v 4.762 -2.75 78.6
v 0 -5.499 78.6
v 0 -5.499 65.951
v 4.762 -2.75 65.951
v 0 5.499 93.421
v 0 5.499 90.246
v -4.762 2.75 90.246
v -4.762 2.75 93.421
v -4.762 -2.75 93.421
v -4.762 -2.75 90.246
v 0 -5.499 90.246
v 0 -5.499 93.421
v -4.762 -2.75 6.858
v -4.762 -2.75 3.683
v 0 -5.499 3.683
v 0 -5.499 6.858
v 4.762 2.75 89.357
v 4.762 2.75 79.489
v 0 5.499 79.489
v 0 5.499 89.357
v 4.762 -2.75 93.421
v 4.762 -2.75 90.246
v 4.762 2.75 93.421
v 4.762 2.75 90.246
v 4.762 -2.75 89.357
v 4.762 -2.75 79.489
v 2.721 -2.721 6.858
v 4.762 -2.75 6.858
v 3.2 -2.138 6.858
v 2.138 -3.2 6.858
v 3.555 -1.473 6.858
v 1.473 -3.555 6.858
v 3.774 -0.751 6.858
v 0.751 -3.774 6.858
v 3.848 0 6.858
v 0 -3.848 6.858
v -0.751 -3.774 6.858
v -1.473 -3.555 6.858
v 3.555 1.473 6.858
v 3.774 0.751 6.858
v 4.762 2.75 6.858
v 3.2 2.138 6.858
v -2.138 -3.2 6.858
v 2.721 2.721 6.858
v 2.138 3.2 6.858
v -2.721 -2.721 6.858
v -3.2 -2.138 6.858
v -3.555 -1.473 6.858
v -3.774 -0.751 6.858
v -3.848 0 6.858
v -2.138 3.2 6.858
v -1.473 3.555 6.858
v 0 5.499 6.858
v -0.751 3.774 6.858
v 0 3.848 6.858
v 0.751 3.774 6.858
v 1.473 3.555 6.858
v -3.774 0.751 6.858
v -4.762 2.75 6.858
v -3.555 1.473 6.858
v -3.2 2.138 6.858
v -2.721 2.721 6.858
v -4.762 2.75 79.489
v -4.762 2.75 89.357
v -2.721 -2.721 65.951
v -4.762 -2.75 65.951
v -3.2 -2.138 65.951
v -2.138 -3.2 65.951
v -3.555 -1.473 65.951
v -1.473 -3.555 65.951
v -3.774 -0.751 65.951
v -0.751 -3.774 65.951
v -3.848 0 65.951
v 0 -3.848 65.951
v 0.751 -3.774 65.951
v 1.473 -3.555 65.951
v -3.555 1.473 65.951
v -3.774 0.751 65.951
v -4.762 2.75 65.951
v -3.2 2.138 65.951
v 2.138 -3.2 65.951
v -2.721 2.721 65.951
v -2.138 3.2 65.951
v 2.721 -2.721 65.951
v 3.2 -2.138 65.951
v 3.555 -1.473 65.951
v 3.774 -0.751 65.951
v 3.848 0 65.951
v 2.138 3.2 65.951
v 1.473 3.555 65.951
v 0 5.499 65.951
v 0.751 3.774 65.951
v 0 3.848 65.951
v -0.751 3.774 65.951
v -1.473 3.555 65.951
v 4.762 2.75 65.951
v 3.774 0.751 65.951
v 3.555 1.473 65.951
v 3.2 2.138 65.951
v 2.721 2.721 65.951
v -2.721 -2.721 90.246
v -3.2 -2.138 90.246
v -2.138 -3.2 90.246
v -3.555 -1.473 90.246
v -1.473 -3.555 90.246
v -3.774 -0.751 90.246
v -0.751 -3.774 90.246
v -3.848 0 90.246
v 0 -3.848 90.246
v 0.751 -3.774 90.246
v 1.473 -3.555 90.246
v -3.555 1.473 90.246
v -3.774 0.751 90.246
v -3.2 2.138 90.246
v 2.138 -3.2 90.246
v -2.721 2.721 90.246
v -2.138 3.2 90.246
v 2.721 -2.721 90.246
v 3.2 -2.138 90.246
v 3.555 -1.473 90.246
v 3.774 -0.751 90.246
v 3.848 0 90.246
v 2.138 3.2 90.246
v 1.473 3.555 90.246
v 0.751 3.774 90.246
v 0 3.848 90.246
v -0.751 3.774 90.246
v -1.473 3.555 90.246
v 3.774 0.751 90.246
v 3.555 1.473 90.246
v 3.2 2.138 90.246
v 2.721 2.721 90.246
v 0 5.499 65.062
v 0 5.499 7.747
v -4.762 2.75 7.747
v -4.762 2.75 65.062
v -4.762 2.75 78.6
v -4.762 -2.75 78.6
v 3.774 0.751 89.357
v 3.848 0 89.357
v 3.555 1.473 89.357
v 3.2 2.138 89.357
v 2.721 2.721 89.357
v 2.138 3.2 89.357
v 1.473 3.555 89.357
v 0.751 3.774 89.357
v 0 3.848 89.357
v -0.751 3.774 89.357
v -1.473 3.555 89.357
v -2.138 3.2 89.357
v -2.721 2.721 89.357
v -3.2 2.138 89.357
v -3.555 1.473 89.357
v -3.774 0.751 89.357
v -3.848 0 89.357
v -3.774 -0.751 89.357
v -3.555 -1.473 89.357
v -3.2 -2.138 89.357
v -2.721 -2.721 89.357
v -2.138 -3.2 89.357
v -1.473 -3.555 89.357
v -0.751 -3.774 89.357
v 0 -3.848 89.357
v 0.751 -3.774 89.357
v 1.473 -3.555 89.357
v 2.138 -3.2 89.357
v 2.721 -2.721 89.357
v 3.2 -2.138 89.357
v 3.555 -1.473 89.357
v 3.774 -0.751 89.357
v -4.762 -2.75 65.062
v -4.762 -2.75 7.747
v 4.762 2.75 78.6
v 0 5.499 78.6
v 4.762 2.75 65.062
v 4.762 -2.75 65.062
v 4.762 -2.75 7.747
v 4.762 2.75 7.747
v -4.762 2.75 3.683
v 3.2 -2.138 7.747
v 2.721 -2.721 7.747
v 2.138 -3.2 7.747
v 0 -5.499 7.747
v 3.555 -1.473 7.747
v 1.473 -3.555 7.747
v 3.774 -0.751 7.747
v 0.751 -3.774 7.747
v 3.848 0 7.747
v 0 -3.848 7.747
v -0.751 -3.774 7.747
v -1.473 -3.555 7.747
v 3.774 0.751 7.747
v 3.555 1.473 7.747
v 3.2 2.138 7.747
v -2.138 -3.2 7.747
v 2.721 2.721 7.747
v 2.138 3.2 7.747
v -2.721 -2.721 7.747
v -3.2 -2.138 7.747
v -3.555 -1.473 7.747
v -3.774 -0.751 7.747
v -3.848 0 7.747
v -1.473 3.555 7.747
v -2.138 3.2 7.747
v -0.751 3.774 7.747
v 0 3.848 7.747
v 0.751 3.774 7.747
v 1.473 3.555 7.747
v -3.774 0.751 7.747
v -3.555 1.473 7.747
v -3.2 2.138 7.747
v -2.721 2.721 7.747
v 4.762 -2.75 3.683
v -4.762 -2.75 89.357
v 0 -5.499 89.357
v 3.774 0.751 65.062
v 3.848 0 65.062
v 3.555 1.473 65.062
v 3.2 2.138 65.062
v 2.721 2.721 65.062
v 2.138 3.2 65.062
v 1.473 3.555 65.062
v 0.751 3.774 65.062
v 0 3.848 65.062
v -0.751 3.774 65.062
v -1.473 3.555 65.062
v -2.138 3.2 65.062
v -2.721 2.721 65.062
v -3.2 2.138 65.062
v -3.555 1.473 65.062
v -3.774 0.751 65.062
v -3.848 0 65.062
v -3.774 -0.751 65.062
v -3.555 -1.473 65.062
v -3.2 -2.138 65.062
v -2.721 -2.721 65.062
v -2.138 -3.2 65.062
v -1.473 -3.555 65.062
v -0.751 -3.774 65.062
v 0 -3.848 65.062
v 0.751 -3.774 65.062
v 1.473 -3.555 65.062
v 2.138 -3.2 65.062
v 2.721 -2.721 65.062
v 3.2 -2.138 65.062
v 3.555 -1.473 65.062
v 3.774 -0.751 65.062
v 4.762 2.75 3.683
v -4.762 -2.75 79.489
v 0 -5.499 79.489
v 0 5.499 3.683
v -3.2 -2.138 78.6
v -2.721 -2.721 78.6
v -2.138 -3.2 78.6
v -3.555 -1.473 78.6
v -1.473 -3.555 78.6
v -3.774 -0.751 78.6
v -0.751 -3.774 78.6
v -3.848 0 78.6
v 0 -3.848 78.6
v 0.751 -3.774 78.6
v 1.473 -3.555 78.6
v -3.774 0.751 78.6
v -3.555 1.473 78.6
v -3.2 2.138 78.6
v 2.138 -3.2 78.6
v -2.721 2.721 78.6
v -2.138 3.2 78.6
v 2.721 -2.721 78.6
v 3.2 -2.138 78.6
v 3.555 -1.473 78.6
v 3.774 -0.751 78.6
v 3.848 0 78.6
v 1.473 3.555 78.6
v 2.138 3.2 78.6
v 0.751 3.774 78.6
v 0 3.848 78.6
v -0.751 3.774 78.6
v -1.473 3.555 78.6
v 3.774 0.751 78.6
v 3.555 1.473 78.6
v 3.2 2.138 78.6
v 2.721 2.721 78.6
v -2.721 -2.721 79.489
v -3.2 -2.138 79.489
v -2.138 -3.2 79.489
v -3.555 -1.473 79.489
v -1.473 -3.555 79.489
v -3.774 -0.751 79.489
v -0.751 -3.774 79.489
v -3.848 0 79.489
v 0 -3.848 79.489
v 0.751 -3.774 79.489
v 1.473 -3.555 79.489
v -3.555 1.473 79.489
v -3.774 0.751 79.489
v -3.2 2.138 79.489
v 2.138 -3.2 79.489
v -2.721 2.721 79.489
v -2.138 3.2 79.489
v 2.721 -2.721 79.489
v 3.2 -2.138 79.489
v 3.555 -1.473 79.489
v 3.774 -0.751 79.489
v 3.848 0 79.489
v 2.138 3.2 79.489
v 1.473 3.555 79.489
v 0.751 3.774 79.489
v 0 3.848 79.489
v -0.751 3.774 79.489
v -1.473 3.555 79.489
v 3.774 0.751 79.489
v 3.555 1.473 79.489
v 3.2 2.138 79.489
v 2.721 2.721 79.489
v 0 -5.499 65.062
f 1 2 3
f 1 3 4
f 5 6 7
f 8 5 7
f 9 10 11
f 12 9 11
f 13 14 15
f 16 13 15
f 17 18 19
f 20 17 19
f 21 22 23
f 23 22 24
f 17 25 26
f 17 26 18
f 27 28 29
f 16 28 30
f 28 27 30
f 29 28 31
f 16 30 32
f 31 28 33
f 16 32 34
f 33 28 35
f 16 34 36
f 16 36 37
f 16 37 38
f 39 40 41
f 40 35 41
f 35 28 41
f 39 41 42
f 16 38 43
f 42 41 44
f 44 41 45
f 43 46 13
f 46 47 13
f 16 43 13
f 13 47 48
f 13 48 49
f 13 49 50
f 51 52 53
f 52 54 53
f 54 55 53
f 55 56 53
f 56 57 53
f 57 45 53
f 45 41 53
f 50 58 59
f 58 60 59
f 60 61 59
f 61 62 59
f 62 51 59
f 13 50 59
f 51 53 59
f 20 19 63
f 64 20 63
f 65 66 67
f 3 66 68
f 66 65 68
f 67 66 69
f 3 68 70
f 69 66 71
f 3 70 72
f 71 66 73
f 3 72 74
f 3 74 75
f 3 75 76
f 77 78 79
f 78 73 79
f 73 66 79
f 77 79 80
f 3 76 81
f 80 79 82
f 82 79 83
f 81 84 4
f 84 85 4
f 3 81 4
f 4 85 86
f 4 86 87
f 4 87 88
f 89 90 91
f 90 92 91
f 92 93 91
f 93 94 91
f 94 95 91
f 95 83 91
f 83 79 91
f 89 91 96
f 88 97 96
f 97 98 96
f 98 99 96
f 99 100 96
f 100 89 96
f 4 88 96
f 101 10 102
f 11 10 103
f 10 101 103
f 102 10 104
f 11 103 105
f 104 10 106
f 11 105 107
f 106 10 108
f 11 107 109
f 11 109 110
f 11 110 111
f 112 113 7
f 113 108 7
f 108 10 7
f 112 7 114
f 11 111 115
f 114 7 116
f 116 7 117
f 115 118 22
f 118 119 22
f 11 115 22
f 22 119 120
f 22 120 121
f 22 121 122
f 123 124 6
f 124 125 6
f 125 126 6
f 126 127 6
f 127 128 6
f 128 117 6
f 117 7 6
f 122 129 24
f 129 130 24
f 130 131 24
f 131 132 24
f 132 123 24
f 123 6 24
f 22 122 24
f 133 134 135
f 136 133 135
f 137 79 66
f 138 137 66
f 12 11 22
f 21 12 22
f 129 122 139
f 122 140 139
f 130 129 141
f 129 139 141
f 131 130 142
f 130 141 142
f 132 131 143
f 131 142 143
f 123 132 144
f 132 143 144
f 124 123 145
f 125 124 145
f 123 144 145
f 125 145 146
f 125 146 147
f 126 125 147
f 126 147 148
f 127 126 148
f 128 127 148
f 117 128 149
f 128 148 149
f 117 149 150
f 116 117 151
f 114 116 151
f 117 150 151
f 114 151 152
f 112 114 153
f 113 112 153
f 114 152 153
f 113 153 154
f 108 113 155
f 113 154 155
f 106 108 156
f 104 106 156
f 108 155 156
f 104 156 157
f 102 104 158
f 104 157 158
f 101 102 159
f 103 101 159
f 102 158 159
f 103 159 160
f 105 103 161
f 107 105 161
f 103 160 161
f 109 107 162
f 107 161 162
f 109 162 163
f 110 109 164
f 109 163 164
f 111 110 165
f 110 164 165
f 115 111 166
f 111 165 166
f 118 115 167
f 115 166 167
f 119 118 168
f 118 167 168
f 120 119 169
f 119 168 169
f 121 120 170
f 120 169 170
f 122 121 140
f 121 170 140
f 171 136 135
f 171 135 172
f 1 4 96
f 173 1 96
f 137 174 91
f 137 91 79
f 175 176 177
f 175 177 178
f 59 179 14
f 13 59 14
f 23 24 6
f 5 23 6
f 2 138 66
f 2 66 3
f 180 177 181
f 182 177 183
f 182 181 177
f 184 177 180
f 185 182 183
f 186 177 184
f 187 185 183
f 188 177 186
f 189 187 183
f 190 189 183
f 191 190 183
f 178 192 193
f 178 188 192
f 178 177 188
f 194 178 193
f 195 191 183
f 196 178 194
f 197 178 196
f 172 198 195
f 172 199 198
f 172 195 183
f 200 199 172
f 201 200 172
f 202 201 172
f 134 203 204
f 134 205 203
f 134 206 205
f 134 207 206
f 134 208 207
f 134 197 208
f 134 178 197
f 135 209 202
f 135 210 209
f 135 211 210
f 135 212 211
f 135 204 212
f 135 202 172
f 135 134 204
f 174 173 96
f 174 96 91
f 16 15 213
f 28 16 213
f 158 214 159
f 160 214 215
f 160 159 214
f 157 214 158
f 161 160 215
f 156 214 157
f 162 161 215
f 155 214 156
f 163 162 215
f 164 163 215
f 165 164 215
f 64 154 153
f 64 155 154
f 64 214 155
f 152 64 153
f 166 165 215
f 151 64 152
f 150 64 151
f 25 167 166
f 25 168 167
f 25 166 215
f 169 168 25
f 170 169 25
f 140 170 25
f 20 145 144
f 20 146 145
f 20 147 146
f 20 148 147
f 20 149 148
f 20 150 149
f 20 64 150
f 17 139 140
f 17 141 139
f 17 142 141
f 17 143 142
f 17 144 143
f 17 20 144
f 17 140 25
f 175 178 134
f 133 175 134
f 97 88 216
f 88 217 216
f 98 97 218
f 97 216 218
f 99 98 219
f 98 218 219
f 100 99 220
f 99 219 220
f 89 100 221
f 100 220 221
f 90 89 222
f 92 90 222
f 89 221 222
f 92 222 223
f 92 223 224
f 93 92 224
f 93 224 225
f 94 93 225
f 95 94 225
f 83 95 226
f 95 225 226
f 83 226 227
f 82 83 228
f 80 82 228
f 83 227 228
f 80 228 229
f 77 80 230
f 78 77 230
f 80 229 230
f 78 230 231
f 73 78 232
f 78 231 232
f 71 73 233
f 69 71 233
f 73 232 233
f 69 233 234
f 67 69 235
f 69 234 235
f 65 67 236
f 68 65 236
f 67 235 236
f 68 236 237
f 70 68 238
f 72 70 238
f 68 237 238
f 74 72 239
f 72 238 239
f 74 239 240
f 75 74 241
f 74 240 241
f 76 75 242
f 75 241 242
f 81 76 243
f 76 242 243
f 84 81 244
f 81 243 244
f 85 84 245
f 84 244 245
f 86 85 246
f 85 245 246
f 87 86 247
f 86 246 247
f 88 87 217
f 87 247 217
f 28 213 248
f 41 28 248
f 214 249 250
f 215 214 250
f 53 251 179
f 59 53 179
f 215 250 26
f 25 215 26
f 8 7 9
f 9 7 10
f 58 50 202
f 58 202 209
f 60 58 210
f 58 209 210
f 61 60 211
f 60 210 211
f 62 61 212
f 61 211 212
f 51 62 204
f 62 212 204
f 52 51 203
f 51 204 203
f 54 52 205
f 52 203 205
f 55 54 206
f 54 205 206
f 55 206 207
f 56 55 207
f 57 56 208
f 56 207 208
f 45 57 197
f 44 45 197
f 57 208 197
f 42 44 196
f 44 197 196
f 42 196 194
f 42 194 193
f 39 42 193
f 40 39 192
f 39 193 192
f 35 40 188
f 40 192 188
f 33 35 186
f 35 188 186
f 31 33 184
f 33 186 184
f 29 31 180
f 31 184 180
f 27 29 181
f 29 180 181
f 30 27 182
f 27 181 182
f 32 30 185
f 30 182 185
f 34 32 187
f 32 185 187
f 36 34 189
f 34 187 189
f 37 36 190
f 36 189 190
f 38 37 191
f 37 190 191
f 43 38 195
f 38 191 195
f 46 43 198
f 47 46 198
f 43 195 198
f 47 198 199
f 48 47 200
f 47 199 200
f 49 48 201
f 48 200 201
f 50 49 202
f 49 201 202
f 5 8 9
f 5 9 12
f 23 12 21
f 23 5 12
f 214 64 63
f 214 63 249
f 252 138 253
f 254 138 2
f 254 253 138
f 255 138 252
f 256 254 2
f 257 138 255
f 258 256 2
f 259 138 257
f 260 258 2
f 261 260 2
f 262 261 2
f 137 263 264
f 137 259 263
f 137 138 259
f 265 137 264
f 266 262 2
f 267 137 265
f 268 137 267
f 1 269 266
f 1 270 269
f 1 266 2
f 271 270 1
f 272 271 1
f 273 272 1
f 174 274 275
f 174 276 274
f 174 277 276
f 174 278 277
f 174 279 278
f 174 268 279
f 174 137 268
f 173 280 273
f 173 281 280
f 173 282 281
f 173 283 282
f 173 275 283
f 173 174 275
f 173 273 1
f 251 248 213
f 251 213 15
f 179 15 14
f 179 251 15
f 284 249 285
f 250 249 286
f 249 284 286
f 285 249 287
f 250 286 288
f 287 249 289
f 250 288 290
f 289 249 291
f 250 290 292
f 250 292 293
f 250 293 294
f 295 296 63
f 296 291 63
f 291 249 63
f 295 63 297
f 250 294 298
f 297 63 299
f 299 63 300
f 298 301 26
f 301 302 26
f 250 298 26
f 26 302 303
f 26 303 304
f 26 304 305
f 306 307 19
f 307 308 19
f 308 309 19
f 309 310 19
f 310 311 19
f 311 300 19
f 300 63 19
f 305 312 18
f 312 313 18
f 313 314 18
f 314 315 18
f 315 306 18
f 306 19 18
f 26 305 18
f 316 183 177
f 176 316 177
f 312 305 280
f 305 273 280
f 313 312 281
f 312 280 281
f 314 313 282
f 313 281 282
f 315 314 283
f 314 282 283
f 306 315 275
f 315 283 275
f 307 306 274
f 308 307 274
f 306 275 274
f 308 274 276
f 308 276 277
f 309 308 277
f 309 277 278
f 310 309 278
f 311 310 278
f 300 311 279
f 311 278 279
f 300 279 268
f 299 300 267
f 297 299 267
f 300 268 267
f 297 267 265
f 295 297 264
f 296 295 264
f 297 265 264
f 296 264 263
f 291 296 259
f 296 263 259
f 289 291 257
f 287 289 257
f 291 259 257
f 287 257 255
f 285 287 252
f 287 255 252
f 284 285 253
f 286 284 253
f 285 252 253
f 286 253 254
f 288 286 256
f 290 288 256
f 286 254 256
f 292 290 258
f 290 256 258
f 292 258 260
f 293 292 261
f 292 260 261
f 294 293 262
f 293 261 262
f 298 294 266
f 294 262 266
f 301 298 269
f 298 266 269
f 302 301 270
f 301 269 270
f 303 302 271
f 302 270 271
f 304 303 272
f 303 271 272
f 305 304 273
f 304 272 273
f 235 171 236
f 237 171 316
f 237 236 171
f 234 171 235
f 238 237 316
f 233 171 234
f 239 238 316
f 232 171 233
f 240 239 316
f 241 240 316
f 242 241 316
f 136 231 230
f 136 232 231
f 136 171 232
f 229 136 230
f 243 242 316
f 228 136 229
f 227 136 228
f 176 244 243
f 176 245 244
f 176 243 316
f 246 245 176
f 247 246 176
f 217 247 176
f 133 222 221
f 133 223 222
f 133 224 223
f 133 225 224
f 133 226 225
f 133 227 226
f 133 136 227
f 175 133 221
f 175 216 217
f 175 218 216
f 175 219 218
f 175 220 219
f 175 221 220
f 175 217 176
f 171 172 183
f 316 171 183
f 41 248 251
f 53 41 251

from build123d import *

# Parameters (mm, degrees)
BOSS_EXTRUDE1_DEPTH = 97.3582
SKETCH5_W           = 11.10345239
SKETCH5_H           = 12.145052052
SKETCH5_R           = 3.8481
CUT_EXTRUDE2_DEPTH  = 0.4445
SKETCH6_W           = 10.752068687
SKETCH6_H           = 11.509710708
SKETCH6_R           = 3.8481
CUT_EXTRUDE3_DEPTH  = 0.4445
SKETCH7_W           = 11.973800556
SKETCH7_H           = 12.349285591
SKETCH7_R           = 3.8481
CUT_EXTRUDE4_DEPTH  = 0.4445
SKETCH8_W           = 12.812601238
SKETCH8_H           = 11.483340014
SKETCH8_R           = 3.8481
CUT_EXTRUDE5_DEPTH  = 0.4445
SKETCH9_W           = 15.274592148
SKETCH9_H           = 13.977564657
CUT_EXTRUDE6_DEPTH  = 3.683
SKETCH11_W          = 19.244818326
SKETCH11_H          = 17.400851683
CUT_EXTRUDE7_DEPTH  = 3.937


with BuildPart() as part:
    # Sketch1 → Boss-Extrude1 (new body)
    with BuildSketch(Plane.XY):
        Polygon((0, 5.499261314), (-4.7625, 2.749630657), (-4.7625, -2.749630657), (0, -5.499261314), (4.7625, -2.749630657), (4.7625, 2.749630657), align=None)
    extrude(amount=BOSS_EXTRUDE1_DEPTH)

    # Sketch5 → Cut-Extrude2 (cut, symmetric)
    with BuildSketch(Plane.XY.offset(79.0448)):
        with Locations((-0.378227241, -0.09440181)):
            Rectangle(SKETCH5_W, SKETCH5_H)
        Circle(SKETCH5_R, mode=Mode.SUBTRACT)
    extrude(amount=CUT_EXTRUDE2_DEPTH, both=True, mode=Mode.SUBTRACT)

    # Sketch6 → Cut-Extrude3 (cut, symmetric)
    with BuildSketch(Plane.XY.offset(65.5066)):
        with Locations((-0.265980709, -0.185380495)):
            Rectangle(SKETCH6_W, SKETCH6_H)
        Circle(SKETCH6_R, mode=Mode.SUBTRACT)
    extrude(amount=CUT_EXTRUDE3_DEPTH, both=True, mode=Mode.SUBTRACT)

    # Sketch7 → Cut-Extrude4 (cut, symmetric)
    with BuildSketch(Plane.XY.offset(89.8017)):
        with Locations((-0.368386295, 0.291901412)):
            Rectangle(SKETCH7_W, SKETCH7_H)
        Circle(SKETCH7_R, mode=Mode.SUBTRACT)
    extrude(amount=CUT_EXTRUDE4_DEPTH, both=True, mode=Mode.SUBTRACT)

    # Sketch8 → Cut-Extrude5 (cut, symmetric)
    with BuildSketch(Plane(origin=(0, 0, 7.3025), x_dir=(-1, 0, 0), z_dir=(0, 0, -1))):
        with Locations((-0.353342966, -0.03551845)):
            Rectangle(SKETCH8_W, SKETCH8_H)
        Circle(SKETCH8_R, mode=Mode.SUBTRACT)
    extrude(amount=CUT_EXTRUDE5_DEPTH, both=True, mode=Mode.SUBTRACT)

    # Sketch9 → Cut-Extrude6 (cut)
    with BuildSketch(Plane(origin=(0, 0, 0), x_dir=(-1, 0, 0), z_dir=(0, 0, -1))):
        with Locations((0.659891111, -0.649631618)):
            Rectangle(SKETCH9_W, SKETCH9_H)
    extrude(amount=-CUT_EXTRUDE6_DEPTH, mode=Mode.SUBTRACT)

    # Sketch11 → Cut-Extrude7 (cut)
    with BuildSketch(Plane.XY.offset(97.3582)):
        with Locations((0.649471759, -1.230390771)):
            Rectangle(SKETCH11_W, SKETCH11_H)
    extrude(amount=-CUT_EXTRUDE7_DEPTH, mode=Mode.SUBTRACT)


solid = part.part
